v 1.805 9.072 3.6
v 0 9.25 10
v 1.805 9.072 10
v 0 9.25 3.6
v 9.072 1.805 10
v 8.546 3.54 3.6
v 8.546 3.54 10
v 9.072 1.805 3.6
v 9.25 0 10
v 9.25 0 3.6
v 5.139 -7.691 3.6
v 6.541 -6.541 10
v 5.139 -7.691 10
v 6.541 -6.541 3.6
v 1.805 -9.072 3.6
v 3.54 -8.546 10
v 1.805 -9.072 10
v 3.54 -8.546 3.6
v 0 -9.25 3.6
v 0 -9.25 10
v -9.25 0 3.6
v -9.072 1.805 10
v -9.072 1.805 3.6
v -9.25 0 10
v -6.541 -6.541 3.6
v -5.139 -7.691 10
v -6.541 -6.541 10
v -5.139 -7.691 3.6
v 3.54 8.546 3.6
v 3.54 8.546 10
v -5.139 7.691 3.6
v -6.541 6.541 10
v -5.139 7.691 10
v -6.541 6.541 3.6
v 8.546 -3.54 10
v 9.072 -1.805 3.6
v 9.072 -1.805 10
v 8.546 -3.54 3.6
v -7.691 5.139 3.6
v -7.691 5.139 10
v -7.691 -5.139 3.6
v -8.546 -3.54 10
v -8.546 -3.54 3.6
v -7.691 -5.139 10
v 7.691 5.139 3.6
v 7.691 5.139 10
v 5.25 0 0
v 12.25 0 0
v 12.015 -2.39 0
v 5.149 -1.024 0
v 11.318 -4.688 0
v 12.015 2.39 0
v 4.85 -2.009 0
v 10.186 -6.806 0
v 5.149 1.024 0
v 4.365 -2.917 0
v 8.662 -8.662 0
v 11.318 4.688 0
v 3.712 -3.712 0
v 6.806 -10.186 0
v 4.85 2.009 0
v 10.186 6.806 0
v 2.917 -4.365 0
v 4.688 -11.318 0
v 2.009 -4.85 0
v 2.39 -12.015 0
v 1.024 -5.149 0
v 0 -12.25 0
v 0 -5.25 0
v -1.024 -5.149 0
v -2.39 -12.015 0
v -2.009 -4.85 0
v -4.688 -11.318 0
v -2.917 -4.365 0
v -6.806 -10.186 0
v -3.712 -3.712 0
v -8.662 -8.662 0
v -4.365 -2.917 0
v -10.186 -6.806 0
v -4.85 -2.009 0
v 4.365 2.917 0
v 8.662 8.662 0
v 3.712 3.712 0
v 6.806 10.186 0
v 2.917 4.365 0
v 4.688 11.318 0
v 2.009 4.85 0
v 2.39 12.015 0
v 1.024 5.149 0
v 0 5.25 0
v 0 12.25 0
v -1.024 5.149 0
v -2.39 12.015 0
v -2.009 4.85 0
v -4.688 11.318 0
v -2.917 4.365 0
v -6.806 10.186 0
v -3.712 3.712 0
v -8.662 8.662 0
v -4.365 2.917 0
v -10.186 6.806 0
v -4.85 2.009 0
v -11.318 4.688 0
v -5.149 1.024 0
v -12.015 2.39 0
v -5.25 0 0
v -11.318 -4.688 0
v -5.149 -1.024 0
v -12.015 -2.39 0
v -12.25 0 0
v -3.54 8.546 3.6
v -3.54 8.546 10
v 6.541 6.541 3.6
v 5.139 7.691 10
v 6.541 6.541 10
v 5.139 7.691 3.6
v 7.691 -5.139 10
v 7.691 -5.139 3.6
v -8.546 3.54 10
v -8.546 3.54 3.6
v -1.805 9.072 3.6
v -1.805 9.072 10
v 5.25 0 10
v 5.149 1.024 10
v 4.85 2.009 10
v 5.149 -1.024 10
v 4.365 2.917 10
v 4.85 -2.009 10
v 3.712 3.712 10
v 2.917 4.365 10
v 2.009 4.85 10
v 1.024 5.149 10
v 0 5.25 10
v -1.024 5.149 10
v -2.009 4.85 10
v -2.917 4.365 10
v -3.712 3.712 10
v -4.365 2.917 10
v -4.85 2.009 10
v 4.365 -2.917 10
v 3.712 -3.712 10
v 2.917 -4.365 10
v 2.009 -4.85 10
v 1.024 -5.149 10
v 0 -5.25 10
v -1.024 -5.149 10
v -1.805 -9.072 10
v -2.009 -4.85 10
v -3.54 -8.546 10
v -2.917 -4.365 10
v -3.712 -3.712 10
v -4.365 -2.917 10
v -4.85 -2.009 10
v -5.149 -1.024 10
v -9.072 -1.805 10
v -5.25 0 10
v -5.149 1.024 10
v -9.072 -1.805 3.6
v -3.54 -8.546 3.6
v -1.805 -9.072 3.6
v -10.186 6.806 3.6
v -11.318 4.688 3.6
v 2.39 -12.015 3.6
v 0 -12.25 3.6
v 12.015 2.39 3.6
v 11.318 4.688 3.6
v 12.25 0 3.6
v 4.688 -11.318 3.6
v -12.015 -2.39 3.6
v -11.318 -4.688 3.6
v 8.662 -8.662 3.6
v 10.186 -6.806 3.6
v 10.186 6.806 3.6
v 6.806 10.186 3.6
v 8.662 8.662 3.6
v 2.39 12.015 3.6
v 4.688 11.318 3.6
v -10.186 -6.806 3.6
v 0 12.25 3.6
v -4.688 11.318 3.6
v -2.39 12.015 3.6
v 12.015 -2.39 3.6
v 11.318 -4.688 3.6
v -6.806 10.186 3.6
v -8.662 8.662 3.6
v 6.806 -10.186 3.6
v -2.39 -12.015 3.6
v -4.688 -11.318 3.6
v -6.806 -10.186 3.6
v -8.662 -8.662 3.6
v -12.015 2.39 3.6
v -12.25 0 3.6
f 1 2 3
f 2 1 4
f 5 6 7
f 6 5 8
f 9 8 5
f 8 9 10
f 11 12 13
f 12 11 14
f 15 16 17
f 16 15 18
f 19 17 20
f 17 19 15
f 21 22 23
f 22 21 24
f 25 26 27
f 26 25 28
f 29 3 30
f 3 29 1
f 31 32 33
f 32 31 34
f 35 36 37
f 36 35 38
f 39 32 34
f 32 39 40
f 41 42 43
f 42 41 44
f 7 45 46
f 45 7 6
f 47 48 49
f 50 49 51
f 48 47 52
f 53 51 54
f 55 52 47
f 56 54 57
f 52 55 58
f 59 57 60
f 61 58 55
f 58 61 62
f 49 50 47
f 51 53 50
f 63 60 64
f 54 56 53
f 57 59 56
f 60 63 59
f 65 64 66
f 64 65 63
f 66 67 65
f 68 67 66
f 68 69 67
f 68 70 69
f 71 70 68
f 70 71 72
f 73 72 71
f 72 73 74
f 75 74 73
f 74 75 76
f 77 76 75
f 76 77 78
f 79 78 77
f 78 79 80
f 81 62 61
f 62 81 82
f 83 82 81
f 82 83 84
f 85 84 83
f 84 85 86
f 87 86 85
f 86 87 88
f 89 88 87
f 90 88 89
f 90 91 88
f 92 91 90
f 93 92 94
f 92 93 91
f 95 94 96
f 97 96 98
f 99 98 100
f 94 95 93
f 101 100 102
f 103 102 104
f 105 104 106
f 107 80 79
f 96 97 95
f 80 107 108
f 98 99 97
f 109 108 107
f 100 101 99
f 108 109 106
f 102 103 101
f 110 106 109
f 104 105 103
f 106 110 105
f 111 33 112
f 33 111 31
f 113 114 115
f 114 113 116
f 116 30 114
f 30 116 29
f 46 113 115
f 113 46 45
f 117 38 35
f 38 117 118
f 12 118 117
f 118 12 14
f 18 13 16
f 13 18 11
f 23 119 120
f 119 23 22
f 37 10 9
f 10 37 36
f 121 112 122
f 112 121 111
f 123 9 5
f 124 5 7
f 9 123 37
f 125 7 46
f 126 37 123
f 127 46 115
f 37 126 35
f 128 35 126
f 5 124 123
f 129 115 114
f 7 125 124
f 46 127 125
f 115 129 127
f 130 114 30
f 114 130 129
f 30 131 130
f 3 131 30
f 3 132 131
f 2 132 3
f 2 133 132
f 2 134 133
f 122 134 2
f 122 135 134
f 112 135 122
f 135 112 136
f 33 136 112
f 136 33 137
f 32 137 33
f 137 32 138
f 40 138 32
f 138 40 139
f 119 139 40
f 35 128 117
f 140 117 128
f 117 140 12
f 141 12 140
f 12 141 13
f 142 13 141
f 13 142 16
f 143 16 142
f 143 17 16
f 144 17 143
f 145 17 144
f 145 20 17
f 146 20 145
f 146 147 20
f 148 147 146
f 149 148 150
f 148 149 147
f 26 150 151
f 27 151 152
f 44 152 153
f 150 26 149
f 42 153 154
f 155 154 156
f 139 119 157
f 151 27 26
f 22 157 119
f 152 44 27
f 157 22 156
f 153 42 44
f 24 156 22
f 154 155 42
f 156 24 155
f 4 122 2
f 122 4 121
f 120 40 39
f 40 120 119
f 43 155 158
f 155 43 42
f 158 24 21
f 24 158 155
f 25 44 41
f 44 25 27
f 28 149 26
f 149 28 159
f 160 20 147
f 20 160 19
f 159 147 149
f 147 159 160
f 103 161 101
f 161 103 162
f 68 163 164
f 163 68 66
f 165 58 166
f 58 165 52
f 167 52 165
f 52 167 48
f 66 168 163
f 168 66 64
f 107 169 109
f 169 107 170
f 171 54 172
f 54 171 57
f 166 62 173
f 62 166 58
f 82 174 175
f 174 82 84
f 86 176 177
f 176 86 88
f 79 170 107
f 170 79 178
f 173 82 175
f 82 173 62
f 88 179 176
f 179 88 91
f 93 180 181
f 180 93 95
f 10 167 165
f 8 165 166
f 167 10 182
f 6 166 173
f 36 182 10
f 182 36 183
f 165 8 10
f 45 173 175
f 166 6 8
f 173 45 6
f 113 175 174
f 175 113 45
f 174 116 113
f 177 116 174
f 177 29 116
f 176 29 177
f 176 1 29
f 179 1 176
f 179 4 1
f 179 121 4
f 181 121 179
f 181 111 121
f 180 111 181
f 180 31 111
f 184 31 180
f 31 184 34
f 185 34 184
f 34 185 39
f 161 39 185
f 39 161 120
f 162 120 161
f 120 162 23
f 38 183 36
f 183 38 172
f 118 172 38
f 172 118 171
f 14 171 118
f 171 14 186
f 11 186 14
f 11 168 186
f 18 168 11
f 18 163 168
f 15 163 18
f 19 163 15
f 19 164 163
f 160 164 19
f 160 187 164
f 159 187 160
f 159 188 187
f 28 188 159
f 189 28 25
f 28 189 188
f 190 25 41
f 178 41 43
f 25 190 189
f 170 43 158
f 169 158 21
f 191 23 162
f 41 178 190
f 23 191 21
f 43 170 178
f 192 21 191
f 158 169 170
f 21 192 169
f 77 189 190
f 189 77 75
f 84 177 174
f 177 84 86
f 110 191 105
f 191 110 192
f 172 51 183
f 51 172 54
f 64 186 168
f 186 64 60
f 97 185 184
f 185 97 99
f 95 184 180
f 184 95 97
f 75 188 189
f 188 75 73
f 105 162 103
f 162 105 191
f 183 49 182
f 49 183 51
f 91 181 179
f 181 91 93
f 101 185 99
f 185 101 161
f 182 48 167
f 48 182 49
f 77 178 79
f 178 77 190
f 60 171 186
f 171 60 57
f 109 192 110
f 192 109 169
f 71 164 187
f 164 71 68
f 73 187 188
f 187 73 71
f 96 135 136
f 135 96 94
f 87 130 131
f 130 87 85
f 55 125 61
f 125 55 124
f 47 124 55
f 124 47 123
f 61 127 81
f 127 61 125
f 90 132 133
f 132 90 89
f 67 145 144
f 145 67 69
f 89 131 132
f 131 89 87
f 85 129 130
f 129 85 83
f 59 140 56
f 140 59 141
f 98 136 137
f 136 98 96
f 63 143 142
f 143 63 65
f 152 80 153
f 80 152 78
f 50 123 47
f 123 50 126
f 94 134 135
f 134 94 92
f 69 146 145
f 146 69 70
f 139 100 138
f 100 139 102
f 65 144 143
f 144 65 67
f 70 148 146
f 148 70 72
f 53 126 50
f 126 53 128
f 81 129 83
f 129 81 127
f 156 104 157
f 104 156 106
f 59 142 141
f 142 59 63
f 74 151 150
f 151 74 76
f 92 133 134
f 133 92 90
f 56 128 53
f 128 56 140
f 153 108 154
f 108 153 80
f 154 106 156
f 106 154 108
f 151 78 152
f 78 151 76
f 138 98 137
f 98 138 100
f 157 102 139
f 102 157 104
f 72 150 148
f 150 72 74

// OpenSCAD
$fn = 32;

// ----------------------------------------------------------------------
// Spacer sleeve: 18.5 / 10.5 x 10 mm
// ----------------------------------------------------------------------

// --- parameters (mm) ---
tube_d = 18.5;            // outside diameter
bore_d = 10.5;            // shaft bore
tube_l = 10;              // sleeve length
flange_d = 24.5;          // collar diameter
flange_t = 3;             // collar thickness

module sleeve() {
  cylinder(h = tube_l, d = tube_d);
  cylinder(h = flange_t + 0.6, d = flange_d);
}

difference() {
  sleeve();
  translate([0, 0, -1]) cylinder(h = tube_l + 2, d = bore_d);
}
